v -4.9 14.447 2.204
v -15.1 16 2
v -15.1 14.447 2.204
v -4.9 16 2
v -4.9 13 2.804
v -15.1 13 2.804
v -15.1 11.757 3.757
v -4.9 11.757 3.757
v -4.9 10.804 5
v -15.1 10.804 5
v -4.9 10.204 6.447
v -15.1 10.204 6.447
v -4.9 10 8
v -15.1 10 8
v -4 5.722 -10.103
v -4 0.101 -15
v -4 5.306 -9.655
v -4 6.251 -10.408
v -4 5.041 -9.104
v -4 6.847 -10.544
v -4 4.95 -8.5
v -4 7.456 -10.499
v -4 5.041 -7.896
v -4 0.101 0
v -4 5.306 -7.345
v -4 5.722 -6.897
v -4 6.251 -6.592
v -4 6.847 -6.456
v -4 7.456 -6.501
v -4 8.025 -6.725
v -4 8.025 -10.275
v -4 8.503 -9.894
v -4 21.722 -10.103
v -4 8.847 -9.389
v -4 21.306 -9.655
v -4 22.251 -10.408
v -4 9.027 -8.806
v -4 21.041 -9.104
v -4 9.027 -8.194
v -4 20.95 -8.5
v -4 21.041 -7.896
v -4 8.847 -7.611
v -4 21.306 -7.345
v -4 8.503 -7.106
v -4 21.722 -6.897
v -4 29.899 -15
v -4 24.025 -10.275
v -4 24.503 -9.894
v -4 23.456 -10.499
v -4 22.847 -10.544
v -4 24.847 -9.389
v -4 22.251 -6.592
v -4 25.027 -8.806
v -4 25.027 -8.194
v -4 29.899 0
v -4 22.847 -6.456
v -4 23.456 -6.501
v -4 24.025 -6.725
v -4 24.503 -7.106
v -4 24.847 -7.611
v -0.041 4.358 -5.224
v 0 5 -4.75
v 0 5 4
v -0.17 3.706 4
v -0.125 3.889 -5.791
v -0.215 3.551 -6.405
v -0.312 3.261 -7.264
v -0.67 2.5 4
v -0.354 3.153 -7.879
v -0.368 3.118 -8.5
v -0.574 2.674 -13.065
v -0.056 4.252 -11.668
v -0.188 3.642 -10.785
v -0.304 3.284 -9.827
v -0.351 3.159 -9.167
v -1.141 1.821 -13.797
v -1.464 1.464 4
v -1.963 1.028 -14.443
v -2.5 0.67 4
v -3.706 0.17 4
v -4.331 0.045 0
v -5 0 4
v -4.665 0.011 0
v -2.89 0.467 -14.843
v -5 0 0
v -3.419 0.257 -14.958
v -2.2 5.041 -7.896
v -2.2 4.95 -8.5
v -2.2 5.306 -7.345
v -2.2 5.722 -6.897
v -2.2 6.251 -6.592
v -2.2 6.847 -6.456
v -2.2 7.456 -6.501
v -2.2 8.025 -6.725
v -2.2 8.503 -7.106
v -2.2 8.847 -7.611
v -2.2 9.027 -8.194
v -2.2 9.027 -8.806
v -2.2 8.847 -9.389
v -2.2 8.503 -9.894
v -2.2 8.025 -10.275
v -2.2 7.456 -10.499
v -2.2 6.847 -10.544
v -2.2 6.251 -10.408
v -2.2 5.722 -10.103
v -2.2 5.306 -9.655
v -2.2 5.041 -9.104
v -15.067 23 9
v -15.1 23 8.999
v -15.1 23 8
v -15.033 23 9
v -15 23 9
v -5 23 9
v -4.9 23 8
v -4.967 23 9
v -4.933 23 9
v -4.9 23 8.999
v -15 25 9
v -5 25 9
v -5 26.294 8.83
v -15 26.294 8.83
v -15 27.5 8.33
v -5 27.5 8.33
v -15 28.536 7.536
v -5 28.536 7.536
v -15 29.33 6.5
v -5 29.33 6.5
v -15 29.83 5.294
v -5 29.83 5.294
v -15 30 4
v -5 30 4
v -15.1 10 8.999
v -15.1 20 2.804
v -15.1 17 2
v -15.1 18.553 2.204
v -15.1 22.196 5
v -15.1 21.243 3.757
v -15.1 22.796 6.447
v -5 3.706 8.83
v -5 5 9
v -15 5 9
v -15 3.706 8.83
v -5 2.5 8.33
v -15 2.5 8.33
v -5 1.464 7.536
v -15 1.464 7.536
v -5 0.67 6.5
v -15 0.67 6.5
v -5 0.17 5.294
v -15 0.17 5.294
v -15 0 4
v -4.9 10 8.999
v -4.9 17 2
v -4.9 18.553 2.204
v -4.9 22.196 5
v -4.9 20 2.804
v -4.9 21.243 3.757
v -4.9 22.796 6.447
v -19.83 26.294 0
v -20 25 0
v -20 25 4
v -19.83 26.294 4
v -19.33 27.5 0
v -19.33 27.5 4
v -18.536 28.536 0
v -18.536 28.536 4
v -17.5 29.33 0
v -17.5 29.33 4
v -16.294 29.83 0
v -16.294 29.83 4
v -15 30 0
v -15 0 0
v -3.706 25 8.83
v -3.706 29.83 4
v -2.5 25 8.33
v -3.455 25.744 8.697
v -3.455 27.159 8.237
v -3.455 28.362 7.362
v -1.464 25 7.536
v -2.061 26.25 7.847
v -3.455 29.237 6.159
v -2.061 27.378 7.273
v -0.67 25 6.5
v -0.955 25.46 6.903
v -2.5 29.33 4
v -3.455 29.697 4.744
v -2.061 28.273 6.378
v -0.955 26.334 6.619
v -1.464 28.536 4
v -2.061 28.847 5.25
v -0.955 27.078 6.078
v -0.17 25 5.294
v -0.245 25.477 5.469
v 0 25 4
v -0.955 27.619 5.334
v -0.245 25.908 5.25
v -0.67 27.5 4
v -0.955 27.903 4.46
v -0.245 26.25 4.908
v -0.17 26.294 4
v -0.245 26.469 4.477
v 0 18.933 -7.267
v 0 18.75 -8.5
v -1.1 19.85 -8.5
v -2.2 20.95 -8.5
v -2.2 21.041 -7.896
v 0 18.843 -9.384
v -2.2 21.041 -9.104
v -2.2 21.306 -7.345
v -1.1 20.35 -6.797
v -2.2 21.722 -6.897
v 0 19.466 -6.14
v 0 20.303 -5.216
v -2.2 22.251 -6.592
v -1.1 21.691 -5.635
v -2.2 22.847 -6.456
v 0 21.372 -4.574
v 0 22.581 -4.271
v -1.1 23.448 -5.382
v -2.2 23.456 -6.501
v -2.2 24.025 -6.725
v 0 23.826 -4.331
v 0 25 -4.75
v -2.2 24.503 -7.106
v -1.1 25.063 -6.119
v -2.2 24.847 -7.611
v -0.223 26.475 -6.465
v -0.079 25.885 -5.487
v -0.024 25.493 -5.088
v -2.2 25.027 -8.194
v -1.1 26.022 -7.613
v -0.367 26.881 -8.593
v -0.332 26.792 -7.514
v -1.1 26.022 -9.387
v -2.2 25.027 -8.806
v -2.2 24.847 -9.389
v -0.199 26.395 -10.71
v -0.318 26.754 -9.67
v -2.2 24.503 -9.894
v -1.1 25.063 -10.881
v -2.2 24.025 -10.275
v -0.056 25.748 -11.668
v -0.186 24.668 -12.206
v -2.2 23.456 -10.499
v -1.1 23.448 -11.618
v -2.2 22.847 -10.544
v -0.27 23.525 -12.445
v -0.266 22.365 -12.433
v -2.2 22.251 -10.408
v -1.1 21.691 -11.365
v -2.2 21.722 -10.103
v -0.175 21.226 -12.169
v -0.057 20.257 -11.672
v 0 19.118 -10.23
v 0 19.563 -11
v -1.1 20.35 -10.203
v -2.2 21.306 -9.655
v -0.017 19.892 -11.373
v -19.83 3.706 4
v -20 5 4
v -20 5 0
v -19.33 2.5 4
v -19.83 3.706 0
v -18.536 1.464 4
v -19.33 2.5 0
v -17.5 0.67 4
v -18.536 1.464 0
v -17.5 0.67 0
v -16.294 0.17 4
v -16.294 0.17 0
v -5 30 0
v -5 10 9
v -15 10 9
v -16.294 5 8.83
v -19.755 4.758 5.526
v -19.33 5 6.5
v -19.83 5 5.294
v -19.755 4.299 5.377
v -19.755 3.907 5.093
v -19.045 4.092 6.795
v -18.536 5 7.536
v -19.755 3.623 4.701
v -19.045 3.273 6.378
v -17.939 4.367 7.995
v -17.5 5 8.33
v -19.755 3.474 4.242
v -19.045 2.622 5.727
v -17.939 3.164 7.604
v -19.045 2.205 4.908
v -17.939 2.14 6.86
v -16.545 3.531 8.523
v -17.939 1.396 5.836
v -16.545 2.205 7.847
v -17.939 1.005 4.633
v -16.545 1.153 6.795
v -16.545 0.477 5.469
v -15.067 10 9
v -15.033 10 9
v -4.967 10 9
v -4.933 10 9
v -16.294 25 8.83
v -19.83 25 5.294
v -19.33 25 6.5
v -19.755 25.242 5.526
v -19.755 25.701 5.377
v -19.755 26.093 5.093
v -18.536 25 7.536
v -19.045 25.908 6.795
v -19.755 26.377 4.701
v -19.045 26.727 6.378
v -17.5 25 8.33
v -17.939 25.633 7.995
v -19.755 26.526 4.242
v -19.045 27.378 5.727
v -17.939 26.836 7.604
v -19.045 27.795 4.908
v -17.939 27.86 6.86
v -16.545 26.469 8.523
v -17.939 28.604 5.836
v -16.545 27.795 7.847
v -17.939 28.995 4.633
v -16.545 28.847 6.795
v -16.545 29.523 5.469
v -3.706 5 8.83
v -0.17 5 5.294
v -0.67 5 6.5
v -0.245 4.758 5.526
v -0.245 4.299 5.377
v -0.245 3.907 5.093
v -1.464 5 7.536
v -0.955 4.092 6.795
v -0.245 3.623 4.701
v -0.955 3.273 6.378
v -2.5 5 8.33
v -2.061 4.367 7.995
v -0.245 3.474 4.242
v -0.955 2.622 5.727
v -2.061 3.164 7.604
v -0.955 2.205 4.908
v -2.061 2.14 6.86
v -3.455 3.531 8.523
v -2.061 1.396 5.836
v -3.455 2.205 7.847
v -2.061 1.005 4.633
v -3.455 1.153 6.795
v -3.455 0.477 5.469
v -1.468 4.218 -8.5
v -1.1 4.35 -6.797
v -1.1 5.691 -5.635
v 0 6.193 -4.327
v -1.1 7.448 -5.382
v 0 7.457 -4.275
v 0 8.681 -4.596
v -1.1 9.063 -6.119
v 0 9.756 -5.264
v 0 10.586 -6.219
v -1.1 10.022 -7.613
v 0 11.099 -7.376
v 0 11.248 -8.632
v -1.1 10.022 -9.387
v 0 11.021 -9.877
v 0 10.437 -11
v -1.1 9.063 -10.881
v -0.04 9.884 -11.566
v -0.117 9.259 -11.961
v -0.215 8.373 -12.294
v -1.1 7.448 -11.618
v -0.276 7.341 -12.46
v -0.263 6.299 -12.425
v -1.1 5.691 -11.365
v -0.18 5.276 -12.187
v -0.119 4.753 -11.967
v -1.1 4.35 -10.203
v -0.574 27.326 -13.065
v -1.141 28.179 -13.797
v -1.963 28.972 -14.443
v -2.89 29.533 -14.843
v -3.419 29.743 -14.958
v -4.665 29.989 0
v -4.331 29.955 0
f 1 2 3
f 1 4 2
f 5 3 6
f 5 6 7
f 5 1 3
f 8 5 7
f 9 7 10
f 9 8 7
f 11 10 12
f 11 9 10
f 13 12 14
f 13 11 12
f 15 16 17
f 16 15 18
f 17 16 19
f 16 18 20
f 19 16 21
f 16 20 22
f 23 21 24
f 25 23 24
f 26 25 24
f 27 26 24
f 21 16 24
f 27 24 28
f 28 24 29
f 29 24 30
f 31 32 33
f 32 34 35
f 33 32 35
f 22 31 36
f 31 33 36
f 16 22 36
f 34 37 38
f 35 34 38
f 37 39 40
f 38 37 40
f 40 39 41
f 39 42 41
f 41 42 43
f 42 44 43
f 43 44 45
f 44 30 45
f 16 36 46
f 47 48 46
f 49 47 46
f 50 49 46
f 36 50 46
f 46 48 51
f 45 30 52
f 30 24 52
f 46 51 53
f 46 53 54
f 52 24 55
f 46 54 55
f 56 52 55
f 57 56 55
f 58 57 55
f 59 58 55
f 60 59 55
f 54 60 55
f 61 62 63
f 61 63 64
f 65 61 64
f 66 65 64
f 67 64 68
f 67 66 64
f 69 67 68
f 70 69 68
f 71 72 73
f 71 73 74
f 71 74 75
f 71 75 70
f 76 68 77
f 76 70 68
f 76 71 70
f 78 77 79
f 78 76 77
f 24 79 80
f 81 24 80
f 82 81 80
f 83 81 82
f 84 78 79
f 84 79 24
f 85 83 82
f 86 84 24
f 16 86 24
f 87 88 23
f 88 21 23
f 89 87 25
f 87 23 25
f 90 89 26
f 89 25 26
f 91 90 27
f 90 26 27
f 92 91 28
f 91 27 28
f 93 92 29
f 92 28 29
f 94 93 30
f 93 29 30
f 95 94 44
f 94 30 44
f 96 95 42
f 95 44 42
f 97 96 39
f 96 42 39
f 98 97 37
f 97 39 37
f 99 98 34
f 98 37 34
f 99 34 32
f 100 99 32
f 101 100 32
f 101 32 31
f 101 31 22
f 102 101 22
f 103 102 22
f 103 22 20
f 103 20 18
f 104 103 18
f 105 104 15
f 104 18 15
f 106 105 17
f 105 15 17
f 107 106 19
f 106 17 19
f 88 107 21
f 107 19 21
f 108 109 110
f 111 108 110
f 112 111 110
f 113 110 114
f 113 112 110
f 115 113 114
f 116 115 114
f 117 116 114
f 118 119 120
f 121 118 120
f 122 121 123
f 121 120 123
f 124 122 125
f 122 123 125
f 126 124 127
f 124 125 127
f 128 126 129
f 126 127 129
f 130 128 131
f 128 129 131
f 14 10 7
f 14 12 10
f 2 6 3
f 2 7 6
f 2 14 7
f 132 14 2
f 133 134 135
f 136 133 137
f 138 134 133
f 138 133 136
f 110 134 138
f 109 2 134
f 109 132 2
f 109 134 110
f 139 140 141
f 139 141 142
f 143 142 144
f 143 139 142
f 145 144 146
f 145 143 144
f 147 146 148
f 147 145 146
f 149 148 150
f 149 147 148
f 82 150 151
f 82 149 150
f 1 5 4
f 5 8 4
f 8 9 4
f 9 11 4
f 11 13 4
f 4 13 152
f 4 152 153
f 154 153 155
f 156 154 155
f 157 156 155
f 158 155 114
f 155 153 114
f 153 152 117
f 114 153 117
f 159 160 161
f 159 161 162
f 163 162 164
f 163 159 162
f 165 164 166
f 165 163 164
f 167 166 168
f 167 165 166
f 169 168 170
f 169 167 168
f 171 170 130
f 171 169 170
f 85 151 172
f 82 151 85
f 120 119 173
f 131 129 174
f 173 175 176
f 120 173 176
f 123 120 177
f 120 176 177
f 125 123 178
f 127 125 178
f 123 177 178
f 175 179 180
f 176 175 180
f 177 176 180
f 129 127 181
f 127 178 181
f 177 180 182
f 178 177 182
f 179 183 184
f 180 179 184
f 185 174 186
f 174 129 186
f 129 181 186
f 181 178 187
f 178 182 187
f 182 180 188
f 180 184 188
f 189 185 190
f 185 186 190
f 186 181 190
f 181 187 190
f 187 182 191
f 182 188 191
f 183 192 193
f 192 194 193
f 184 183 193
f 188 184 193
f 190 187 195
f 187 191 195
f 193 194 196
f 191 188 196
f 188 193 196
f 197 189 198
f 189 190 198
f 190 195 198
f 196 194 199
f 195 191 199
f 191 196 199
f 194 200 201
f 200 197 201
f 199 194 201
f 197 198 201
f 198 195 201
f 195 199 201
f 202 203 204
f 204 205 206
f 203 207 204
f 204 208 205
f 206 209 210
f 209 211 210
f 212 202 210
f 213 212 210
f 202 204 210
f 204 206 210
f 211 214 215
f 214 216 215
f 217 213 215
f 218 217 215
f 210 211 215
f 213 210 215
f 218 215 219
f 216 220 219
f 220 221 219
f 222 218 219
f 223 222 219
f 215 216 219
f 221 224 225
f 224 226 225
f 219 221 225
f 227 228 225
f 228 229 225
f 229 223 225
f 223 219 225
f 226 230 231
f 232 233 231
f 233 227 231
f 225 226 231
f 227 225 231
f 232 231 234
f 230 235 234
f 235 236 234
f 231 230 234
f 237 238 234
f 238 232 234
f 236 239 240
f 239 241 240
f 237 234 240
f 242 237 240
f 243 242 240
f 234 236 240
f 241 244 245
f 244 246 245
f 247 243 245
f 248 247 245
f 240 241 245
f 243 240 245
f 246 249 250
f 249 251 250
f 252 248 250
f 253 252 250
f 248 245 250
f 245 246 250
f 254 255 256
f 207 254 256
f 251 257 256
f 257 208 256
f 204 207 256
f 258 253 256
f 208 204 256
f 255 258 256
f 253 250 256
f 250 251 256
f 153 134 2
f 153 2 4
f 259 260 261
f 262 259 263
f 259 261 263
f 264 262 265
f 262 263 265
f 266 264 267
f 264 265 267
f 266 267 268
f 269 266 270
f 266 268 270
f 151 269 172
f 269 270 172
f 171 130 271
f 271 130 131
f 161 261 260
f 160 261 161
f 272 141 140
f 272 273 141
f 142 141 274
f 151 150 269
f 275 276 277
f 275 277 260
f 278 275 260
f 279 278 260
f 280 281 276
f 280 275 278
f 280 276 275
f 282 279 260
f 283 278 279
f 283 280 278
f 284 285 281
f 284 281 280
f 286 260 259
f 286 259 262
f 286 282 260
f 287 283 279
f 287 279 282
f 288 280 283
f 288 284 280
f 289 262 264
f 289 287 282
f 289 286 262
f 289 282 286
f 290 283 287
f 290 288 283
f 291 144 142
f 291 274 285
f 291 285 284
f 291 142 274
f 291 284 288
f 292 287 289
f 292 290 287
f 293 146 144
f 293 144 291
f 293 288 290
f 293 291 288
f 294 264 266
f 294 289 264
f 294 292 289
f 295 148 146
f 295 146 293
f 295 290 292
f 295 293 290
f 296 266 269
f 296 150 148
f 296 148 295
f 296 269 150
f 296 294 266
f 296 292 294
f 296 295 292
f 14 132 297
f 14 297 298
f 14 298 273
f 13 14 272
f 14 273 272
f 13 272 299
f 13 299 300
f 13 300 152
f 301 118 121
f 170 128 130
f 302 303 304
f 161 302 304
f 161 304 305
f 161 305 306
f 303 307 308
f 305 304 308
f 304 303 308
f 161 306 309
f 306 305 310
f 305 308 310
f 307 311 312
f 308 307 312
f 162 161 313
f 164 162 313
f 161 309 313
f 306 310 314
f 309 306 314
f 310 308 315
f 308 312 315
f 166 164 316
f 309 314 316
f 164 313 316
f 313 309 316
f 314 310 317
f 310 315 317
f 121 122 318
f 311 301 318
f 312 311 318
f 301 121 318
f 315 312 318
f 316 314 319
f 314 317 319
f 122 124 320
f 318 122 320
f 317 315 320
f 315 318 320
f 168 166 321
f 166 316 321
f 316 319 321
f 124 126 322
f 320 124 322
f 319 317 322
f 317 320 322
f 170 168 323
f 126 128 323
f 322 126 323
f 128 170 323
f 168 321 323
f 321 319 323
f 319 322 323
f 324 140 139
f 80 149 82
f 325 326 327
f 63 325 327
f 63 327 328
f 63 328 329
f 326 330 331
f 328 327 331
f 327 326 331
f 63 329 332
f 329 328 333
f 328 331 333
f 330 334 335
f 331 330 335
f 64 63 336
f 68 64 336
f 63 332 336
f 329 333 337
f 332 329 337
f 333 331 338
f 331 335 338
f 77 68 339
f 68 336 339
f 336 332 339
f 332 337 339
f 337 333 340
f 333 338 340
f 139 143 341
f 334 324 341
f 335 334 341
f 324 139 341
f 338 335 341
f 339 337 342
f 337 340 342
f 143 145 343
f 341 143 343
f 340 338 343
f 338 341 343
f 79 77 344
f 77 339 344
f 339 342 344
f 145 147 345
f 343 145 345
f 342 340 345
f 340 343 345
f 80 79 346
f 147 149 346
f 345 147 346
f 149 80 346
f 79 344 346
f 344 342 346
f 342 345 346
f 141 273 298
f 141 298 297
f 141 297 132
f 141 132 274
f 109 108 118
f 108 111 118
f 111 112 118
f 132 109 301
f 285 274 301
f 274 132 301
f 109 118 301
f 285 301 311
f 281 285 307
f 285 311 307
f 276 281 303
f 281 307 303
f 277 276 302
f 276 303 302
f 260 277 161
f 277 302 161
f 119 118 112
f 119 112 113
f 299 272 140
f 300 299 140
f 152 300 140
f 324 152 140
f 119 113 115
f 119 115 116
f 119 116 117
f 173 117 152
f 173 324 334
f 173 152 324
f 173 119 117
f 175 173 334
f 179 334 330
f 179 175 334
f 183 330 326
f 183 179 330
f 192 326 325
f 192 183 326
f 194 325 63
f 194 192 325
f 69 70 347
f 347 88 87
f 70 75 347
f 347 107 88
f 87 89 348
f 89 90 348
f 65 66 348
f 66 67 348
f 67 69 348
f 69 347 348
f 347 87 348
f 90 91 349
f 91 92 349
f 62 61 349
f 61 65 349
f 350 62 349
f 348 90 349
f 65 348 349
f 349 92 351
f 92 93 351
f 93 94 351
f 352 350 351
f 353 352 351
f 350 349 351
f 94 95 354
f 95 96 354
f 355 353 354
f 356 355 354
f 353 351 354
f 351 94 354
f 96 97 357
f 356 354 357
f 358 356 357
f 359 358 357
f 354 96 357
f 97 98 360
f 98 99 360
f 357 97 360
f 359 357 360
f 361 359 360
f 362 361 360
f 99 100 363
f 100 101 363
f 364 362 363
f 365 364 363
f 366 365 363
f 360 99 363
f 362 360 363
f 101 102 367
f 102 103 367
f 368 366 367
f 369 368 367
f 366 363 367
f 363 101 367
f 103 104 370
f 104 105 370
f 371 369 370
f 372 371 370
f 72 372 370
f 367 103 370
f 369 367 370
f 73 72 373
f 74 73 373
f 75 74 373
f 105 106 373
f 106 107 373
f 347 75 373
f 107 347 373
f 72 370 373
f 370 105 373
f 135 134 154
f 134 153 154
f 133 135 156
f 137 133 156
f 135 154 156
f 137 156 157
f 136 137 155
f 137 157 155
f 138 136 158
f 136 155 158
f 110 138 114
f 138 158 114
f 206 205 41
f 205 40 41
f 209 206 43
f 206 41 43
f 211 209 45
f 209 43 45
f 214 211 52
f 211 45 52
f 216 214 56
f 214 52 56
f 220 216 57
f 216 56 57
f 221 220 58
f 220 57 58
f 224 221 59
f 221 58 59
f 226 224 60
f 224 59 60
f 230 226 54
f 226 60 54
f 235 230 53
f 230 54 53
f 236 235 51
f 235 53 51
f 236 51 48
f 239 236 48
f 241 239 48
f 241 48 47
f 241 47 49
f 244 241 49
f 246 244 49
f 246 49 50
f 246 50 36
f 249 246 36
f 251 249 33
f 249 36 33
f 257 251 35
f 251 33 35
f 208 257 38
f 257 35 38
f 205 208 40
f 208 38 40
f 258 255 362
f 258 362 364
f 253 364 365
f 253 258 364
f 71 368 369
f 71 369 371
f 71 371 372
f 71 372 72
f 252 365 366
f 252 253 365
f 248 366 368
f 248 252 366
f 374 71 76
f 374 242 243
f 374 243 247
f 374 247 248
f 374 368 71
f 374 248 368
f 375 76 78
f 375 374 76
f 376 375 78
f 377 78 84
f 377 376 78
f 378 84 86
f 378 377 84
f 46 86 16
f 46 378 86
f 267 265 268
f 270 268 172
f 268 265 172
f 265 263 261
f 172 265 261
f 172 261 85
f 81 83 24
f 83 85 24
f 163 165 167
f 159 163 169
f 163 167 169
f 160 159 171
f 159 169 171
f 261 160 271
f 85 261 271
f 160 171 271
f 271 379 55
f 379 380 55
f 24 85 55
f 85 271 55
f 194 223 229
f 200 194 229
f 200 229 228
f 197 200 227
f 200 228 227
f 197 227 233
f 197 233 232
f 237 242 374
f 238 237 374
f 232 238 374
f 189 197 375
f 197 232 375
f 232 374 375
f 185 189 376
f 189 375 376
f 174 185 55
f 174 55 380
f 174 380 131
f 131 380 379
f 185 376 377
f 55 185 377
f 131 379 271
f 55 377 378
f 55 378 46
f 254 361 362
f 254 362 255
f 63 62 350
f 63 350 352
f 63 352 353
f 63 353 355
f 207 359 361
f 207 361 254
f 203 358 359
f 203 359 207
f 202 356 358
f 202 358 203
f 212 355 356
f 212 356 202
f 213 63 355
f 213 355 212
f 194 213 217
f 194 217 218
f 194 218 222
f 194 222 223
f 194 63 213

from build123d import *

# Parameters (mm, degrees)
F0_W            = 20
F0_H            = 30
F1_DEPTH        = 9
F4_W            = 10.2
F4_H            = 13
F5_DEPTH        = 7
F2_W            = 4
F2_H            = 30
F6_DEPTH        = 15
F7_R            = 6
F10_D           = 4.1
F10_CSINK_D     = 8.5
F10_CSINK_ANGLE = 90
F11_F1_R        = 5
F11_F2_R        = 5
F11_T3_DEPTH    = 20
F11_T5_DEPTH    = 16.5
F11_T8_ANGLE    = 90
F11_T10_ANGLE   = 90
F11_T11_DEPTH   = 20
F11_T13_DEPTH   = 31.5
F11_T16_ANGLE   = 90
F11_T18_ANGLE   = 90
F13_T1_DEPTH    = 40


# Not quite as in the source:
# - a fillet or chamfer that OpenCascade refuses, or shapes differently, is made with other operations: its cross-section is extruded or revolved along the edge and cut away or added
# - a feature of the source that left no trace in its solid (it failed there, or was rolled back) is left out


with BuildPart() as f1:
    # F0 (on Top) → F1 (new body)
    with BuildSketch(Plane.XY):
        with Locations((-10, 15)):
            Rectangle(F0_W, F0_H)
    extrude(amount=F1_DEPTH)

    # F4 (on offset) → F5 (cut)
    with BuildSketch(Plane.XY.offset(9)):
        with Locations((-10, 16.5)):
            Rectangle(F4_W, F4_H)
    extrude(amount=-F5_DEPTH, mode=Mode.SUBTRACT)

    # F2 (on Top) → F6 (join)
    with BuildSketch(Plane.XY):
        with Locations((-2, 15)):
            Rectangle(F2_W, F2_H)
    extrude(amount=-F6_DEPTH)

    # F7
    f7_edges = [f1.edges().sort_by_distance(p)[0] for p in [
        (-10, 10, 2),
        (-10, 23, 2),
    ]]
    fillet(f7_edges, radius=F7_R)

    # F10 (through all)
    with Locations(Plane.YZ):
        with Locations((7, -8.5), (23, -8.5)):
            CounterSinkHole(F10_D / 2, F10_CSINK_D / 2, counter_sink_angle=F10_CSINK_ANGLE)

    # F11: fillet of radius 5 on 4 edges, made by hand

    # F11_f1
    f11_f1_edges = [f1.edges().sort_by_distance(p)[0] for p in [
        (-10, 0, 9),
    ]]
    fillet(f11_f1_edges, radius=F11_F1_R)

    # F11_f2
    f11_f2_edges = [f1.edges().sort_by_distance(p)[0] for p in [
        (-10, 30, 9),
    ]]
    fillet(f11_f2_edges, radius=F11_F2_R)

    # F11_s4 → F11_t3 (cut)
    with BuildSketch(Plane.XZ.offset(-25)):
        with BuildLine():
            ThreePointArc((-15, 9), (-18.5355339059, 7.5355339059), (-20, 4))
            Line((-20, 4), (-20.1, 4))
            Line((-20.1, 4), (-20.1, 9.1))
            Line((-20.1, 9.1), (-15, 9.1))
            Line((-15, 9.1), (-15, 9))
        make_face()
    extrude(amount=F11_T3_DEPTH, mode=Mode.SUBTRACT)

    # F11_s6 → F11_t5 (cut)
    with BuildSketch(Plane.XY.offset(-12.5)):
        with BuildLine():
            ThreePointArc((-20, 5), (-18.5355339059, 1.4644660941), (-15, 0))
            Line((-15, 0), (-15, -0.1))
            Line((-15, -0.1), (-20.1, -0.1))
            Line((-20.1, -0.1), (-20.1, 5))
            Line((-20.1, 5), (-20, 5))
        make_face()
        with BuildLine():
            ThreePointArc((-20, 25), (-18.5355339059, 28.5355339059), (-15, 30))
            Line((-15, 30), (-15, 30.1))
            Line((-15, 30.1), (-20.1, 30.1))
            Line((-20.1, 30.1), (-20.1, 25))
            Line((-20.1, 25), (-20, 25))
        make_face()
    extrude(amount=F11_T5_DEPTH, mode=Mode.SUBTRACT)

    # F11_s7 → F11_t8 (revolve, cut)
    with BuildSketch(Plane.XZ.offset(-25)):
        with BuildLine():
            ThreePointArc((-20, 4), (-18.5355339059, 7.5355339059), (-15, 9))
            Line((-15, 9), (-15, 9.1))
            Line((-15, 9.1), (-20.1, 9.1))
            Line((-20.1, 9.1), (-20.1, 4))
            Line((-20.1, 4), (-20, 4))
        make_face()
    revolve(axis=Axis((-20, 25, 4), (-1, 0, 0)), revolution_arc=F11_T8_ANGLE, mode=Mode.SUBTRACT)

    # F11_s9 → F11_t10 (revolve, cut)
    with BuildSketch(Plane.XZ.offset(-5)):
        with BuildLine():
            ThreePointArc((-20, 4), (-18.5355339059, 7.5355339059), (-15, 9))
            Line((-15, 9), (-15, 9.1))
            Line((-15, 9.1), (-20.1, 9.1))
            Line((-20.1, 9.1), (-20.1, 4))
            Line((-20.1, 4), (-20, 4))
        make_face()
    revolve(axis=Axis((-20, 5, 4), (1, 0, 0)), revolution_arc=F11_T10_ANGLE, mode=Mode.SUBTRACT)

    # F11_s12 → F11_t11 (cut)
    with BuildSketch(Plane.XZ.offset(-25)):
        with BuildLine():
            ThreePointArc((-5, 9), (-1.4644660941, 7.5355339059), (0, 4))
            Line((0, 4), (0.1, 4))
            Line((0.1, 4), (0.1, 9.1))
            Line((0.1, 9.1), (-5, 9.1))
            Line((-5, 9.1), (-5, 9))
        make_face()
    extrude(amount=F11_T11_DEPTH, mode=Mode.SUBTRACT)

    # F11_s14 → F11_t13 (cut)
    with BuildSketch(Plane.XY.offset(-27.5)):
        with BuildLine():
            ThreePointArc((0, 25), (-1.4644660941, 28.5355339059), (-5, 30))
            Line((-5, 30), (-5, 30.1))
            Line((-5, 30.1), (0.1, 30.1))
            Line((0.1, 30.1), (0.1, 25))
            Line((0.1, 25), (0, 25))
        make_face()
        with BuildLine():
            ThreePointArc((0, 5), (-1.4644660941, 1.4644660941), (-5, 0))
            Line((-5, 0), (-5, -0.1))
            Line((-5, -0.1), (0.1, -0.1))
            Line((0.1, -0.1), (0.1, 5))
            Line((0.1, 5), (0, 5))
        make_face()
    extrude(amount=F11_T13_DEPTH, mode=Mode.SUBTRACT)

    # F11_s15 → F11_t16 (revolve, cut)
    with BuildSketch(Plane.XZ.offset(-5)):
        with BuildLine():
            ThreePointArc((0, 4), (-1.4644660941, 7.5355339059), (-5, 9))
            Line((-5, 9), (-5, 9.1))
            Line((-5, 9.1), (0.1, 9.1))
            Line((0.1, 9.1), (0.1, 4))
            Line((0.1, 4), (0, 4))
        make_face()
    revolve(axis=Axis((0, 5, 4), (1, 0, 0)), revolution_arc=F11_T16_ANGLE, mode=Mode.SUBTRACT)

    # F11_s17 → F11_t18 (revolve, cut)
    with BuildSketch(Plane.XZ.offset(-25)):
        with BuildLine():
            ThreePointArc((-5, 9), (-1.4644660941, 7.5355339059), (0, 4))
            Line((0, 4), (0.1, 4))
            Line((0.1, 4), (0.1, 9.1))
            Line((0.1, 9.1), (-5, 9.1))
            Line((-5, 9.1), (-5, 9))
        make_face()
    revolve(axis=Axis((0, 25, 4), (-1, 0, 0)), revolution_arc=F11_T18_ANGLE, mode=Mode.SUBTRACT)

    # F13: fillet of radius 4 on 1 edges, made by hand

    # F13_s2 → F13_t1 (cut)
    with BuildSketch(Plane.XZ.offset(-35)):
        with BuildLine():
            ThreePointArc((0, -11), (-1.1715728753, -13.8284271247), (-4, -15))
            Line((-4, -15), (0, -15))
            Line((0, -15), (0, -11))
        make_face()
    extrude(amount=F13_T1_DEPTH, mode=Mode.SUBTRACT)


solid = f1.part
